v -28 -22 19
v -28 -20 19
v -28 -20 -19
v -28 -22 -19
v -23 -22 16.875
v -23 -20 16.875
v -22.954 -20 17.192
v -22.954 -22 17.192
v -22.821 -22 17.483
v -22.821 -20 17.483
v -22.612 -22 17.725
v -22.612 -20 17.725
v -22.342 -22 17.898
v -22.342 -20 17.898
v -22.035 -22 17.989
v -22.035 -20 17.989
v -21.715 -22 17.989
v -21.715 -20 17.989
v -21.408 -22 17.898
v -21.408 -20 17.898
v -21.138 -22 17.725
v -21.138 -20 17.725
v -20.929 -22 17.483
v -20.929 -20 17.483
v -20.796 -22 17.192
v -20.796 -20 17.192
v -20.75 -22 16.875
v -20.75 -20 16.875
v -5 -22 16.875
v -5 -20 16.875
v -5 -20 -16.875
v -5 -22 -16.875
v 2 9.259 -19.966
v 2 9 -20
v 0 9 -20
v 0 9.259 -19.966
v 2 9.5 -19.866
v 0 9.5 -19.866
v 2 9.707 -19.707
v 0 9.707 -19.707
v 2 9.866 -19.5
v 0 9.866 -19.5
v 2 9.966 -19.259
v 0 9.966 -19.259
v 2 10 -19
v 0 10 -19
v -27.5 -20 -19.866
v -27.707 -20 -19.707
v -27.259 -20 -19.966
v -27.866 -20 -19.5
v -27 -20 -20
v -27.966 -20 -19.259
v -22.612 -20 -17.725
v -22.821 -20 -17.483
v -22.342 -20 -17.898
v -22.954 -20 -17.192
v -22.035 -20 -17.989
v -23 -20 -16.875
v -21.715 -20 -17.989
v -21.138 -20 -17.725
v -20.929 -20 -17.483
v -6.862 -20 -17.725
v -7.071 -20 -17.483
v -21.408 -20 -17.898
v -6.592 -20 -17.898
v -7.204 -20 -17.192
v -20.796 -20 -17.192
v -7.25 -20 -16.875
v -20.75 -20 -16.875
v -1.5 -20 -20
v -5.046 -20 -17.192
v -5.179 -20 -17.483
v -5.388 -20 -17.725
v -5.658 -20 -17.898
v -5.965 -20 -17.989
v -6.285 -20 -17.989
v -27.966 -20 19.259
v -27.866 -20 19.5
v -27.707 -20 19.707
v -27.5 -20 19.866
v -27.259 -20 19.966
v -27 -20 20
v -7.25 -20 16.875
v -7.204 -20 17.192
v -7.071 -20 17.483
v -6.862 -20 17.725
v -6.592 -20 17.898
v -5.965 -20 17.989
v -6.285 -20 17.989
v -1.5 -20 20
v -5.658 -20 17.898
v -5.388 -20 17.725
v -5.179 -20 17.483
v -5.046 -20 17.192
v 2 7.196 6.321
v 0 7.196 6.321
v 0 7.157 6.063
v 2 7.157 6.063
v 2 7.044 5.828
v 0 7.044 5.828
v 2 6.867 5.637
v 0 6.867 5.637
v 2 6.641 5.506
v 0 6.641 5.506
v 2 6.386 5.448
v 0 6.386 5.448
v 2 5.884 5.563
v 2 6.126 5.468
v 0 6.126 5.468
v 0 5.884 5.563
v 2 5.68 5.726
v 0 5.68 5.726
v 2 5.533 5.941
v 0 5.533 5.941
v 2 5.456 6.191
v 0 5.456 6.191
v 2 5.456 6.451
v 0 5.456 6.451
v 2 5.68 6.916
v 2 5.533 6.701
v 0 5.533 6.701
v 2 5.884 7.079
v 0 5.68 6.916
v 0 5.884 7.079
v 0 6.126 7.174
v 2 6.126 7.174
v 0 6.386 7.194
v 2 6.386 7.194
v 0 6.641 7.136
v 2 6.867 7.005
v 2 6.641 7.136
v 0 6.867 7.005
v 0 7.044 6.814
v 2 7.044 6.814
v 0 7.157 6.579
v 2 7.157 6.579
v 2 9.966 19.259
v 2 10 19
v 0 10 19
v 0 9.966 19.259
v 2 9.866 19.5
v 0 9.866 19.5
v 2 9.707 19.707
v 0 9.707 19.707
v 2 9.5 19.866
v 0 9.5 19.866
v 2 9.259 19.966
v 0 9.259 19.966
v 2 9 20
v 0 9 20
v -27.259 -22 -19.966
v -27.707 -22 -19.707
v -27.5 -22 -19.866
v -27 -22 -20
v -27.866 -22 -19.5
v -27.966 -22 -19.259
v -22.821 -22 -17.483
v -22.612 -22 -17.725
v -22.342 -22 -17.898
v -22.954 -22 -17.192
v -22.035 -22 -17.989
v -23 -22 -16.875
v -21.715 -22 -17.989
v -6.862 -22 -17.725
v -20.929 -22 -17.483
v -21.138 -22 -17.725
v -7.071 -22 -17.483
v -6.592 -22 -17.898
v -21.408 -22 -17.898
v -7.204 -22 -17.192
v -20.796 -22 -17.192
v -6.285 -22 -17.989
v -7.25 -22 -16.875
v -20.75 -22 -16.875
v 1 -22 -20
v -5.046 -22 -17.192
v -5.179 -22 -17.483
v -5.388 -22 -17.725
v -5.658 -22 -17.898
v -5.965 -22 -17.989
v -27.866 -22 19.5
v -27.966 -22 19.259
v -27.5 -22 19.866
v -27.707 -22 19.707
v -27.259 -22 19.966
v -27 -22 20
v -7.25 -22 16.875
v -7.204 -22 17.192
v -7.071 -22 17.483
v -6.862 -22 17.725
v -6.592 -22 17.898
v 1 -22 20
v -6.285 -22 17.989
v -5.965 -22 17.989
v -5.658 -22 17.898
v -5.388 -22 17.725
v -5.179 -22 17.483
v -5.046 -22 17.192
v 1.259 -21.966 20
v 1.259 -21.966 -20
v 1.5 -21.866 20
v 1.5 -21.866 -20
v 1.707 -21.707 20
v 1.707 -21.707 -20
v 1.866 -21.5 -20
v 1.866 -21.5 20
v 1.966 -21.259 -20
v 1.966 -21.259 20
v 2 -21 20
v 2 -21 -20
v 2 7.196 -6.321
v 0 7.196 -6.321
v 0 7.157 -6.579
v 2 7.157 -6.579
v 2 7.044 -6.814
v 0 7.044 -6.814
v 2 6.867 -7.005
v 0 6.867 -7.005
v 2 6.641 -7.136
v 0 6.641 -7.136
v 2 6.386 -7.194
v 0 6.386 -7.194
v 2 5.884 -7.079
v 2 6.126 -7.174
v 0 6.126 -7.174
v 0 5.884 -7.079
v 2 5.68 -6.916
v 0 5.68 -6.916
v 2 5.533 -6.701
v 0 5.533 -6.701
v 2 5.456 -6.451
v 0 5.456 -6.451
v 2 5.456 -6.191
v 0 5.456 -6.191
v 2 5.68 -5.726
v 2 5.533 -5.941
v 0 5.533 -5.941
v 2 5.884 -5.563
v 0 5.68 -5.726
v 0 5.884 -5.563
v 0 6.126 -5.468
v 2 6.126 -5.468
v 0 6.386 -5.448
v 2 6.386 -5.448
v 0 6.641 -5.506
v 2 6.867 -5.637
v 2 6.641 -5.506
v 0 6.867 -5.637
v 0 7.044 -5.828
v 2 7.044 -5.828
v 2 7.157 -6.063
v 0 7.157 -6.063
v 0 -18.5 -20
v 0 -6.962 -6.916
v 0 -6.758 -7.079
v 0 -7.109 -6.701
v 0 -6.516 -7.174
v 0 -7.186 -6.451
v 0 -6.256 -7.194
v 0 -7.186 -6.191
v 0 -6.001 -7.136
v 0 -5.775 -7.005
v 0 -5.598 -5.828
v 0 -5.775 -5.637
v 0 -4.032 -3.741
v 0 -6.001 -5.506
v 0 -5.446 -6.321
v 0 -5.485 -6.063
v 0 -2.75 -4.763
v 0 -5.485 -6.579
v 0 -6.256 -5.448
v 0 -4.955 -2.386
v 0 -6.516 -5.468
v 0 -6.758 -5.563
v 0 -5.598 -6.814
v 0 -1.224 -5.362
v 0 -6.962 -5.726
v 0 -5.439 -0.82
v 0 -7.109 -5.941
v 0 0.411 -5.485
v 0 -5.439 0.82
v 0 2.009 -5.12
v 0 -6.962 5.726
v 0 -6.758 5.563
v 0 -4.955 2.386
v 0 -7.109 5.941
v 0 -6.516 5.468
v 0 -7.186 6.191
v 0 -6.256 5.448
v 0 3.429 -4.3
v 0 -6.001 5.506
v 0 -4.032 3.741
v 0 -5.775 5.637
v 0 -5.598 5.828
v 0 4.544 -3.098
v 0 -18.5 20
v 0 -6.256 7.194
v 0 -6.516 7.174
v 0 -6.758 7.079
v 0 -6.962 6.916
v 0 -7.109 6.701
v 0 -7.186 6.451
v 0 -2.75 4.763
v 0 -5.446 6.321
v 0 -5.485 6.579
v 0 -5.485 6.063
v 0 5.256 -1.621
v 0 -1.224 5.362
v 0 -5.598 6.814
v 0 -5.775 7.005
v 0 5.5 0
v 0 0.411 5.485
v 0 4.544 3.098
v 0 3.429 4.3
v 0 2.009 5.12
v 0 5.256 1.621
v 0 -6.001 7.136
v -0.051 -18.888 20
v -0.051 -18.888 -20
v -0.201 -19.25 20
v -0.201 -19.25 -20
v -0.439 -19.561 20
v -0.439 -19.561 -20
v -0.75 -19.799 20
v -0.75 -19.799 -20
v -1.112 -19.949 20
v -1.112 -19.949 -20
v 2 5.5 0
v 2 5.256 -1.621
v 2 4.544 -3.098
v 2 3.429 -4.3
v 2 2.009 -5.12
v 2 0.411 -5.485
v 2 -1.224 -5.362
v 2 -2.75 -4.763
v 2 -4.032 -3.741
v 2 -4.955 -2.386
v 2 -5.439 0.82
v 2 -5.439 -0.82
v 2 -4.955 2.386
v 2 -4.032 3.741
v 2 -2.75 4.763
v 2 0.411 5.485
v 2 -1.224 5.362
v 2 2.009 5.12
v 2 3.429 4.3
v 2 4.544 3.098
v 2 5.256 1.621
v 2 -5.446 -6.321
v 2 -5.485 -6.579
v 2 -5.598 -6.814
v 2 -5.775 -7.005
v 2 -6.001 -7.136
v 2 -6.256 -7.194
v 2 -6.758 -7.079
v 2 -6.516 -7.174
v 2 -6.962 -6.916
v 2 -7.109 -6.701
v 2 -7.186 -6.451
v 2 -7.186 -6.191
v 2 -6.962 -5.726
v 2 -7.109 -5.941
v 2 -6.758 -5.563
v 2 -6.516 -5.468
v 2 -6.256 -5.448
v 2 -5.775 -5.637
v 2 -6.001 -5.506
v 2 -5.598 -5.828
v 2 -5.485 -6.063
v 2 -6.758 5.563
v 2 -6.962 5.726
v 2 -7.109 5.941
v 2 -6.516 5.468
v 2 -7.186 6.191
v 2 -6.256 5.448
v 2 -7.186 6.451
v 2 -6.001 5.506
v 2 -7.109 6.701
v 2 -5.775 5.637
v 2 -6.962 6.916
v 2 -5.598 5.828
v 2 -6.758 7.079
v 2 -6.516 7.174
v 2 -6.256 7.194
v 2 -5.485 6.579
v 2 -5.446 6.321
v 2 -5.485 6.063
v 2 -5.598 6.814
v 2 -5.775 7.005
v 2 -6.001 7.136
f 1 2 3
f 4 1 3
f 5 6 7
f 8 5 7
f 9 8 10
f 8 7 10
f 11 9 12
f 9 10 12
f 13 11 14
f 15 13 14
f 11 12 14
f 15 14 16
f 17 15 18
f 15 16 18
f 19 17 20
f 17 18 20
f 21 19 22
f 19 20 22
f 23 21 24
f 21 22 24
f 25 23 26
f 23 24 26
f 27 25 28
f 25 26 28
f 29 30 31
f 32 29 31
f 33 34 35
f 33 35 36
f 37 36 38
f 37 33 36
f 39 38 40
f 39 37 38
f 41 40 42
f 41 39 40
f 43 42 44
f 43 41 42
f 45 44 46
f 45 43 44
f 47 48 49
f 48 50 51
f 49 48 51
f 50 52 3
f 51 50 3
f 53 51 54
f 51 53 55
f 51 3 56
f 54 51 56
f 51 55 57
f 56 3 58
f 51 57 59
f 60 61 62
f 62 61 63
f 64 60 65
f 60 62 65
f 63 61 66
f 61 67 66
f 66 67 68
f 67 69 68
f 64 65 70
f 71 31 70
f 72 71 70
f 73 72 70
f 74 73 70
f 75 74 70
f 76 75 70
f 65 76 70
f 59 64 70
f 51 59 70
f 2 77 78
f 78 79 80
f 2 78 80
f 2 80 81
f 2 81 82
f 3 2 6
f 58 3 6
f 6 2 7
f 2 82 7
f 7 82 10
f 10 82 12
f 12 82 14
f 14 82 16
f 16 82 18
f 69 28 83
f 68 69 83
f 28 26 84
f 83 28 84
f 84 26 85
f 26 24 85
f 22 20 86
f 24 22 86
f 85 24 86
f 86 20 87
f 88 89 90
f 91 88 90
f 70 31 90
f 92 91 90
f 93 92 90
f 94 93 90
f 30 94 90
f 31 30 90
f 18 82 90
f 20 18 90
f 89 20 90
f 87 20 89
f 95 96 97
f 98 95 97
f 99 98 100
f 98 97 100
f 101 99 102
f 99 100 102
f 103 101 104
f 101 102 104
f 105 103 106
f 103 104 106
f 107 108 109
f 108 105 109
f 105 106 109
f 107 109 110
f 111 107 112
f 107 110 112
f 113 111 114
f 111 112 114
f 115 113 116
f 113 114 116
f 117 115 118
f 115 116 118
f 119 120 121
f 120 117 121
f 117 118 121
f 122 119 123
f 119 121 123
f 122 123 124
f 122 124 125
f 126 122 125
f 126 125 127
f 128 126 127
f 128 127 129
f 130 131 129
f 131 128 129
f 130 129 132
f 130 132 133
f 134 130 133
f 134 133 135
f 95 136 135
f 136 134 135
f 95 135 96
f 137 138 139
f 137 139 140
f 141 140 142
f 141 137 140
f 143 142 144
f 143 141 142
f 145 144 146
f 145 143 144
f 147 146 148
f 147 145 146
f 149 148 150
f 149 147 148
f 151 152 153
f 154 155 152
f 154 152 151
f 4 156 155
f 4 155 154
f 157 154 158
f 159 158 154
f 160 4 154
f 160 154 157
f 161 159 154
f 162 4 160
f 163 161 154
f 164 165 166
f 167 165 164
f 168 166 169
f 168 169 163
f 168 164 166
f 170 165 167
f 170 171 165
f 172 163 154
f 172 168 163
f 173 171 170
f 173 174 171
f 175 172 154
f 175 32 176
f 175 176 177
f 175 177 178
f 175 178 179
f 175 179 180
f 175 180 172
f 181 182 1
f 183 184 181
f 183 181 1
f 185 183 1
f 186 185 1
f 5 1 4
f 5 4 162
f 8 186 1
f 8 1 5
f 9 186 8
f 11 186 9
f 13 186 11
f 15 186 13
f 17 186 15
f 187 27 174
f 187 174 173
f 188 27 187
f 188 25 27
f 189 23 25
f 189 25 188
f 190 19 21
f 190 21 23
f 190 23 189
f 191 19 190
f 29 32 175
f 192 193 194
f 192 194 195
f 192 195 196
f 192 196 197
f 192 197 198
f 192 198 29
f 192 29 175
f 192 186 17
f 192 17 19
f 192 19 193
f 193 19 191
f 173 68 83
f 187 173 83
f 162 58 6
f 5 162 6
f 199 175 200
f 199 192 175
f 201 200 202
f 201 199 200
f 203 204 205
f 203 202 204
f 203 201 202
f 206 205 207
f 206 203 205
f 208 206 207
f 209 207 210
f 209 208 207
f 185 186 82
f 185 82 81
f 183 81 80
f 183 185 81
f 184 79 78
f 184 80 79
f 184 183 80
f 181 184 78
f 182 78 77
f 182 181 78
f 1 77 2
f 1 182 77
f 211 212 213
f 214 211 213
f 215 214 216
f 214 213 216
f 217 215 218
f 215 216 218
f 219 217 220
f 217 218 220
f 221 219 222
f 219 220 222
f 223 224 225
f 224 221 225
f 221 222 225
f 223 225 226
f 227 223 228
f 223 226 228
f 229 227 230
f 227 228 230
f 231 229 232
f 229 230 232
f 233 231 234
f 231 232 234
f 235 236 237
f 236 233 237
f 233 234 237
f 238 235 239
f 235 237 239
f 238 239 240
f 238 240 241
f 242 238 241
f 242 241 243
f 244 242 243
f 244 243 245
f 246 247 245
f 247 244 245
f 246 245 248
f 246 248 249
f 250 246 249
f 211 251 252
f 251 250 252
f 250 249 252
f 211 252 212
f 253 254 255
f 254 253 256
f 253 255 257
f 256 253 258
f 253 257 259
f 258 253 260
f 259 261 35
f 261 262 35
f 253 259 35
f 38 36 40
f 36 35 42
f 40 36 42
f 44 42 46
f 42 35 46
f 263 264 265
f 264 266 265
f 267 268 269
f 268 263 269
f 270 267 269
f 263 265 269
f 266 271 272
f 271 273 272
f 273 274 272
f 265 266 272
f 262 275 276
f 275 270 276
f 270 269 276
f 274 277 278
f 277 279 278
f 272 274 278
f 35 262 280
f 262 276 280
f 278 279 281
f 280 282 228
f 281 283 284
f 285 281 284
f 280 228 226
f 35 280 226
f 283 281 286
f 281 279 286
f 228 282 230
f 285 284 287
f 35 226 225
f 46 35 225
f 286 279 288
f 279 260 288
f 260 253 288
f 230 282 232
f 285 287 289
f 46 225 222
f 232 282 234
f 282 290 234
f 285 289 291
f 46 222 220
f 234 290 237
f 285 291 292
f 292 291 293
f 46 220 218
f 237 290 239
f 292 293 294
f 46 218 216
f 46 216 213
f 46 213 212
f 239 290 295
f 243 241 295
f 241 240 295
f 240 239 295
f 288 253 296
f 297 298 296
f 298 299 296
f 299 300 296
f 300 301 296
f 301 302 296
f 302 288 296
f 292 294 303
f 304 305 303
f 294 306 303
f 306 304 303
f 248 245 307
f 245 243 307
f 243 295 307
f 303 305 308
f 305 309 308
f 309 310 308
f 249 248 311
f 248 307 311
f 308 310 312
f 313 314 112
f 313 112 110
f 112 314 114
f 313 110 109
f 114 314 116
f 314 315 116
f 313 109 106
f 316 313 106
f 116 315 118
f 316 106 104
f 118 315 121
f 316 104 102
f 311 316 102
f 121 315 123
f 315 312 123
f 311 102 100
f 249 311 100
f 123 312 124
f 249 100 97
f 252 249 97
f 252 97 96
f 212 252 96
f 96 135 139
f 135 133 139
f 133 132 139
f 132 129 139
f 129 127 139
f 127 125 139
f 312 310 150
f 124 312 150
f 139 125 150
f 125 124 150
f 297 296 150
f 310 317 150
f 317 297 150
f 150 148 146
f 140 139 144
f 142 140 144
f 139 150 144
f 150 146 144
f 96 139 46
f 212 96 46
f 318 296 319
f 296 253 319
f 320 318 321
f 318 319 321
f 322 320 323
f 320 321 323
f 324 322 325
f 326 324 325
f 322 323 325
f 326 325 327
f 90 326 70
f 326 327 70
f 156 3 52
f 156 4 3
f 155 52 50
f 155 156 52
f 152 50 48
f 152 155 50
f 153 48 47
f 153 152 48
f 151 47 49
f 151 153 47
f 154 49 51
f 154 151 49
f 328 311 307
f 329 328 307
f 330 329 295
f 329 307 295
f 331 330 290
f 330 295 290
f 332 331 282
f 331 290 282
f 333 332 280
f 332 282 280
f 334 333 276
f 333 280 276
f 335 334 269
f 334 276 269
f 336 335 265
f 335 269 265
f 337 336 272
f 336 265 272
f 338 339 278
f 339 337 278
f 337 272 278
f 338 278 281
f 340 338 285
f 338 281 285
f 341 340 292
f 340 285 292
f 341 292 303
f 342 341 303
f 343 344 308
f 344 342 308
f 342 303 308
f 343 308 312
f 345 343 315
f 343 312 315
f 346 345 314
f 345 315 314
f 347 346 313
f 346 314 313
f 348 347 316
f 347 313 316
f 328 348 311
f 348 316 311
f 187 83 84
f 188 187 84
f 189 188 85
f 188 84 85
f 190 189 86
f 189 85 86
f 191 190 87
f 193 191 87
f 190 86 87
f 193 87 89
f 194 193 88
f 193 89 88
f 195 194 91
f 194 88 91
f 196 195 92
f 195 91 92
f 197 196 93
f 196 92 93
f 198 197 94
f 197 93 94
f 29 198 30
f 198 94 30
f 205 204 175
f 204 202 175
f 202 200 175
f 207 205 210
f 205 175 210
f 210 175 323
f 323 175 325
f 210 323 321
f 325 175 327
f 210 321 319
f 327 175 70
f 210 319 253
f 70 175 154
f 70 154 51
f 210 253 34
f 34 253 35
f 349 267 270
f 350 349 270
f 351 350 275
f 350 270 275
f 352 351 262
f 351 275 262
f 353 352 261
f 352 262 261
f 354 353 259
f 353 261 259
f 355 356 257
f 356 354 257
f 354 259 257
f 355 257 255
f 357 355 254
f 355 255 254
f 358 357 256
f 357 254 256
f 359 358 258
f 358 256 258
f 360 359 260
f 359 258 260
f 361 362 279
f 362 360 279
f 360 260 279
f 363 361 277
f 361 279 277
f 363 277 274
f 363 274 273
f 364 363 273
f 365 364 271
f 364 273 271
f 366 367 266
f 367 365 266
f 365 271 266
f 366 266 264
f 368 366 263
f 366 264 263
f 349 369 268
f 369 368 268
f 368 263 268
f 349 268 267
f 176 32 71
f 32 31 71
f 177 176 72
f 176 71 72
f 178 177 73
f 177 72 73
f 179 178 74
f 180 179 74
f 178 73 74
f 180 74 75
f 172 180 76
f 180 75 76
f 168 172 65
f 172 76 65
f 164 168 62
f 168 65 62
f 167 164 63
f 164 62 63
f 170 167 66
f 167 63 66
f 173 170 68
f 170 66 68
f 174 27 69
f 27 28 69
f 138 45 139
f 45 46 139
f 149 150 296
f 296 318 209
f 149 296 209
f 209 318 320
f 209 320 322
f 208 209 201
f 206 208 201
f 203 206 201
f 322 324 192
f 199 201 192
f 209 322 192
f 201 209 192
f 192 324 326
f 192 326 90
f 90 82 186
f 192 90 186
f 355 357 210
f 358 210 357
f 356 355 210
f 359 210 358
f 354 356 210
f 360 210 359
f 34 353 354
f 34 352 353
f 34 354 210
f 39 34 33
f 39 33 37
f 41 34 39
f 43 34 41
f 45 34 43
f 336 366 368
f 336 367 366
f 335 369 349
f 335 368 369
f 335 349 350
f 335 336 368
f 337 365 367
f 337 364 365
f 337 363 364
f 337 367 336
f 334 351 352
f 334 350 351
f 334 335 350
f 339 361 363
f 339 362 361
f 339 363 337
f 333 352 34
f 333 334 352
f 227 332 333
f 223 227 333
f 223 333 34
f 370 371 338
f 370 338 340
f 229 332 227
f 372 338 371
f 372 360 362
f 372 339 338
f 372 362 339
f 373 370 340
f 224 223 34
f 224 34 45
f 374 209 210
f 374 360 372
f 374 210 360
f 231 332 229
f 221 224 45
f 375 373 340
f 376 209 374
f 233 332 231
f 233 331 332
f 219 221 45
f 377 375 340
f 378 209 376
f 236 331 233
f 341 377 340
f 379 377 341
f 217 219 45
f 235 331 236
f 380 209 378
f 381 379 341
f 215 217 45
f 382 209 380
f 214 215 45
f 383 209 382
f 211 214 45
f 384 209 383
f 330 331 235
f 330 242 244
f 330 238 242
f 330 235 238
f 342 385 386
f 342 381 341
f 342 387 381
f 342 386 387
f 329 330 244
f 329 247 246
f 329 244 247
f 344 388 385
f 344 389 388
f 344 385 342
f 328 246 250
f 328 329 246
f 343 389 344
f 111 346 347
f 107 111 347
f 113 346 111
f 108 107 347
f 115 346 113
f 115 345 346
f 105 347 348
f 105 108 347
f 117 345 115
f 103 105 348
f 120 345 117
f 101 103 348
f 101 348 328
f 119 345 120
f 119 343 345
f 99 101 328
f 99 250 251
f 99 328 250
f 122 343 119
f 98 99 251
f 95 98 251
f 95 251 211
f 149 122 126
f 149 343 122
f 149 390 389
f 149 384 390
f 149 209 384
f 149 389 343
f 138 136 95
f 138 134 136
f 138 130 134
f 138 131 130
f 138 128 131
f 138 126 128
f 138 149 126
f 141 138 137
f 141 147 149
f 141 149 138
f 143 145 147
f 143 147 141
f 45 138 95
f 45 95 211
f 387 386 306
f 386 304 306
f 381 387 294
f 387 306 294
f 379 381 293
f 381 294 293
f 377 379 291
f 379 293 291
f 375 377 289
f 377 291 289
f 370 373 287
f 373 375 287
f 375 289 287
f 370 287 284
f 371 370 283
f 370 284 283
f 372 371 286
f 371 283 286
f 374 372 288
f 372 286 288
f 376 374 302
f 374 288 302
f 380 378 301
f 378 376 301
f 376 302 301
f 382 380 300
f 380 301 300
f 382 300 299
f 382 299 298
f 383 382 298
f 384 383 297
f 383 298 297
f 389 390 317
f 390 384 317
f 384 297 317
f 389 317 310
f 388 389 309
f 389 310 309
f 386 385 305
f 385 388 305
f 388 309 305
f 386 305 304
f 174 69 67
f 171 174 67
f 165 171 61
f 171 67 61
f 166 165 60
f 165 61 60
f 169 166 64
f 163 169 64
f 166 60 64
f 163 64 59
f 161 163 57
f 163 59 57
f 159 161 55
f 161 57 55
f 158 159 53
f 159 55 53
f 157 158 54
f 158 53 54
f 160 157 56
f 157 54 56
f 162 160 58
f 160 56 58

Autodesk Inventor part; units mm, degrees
ref_plane "YZ Plane" through (0, 0, 0) normal (1, 0, 0) x (0, 1, 0)
ref_plane "XZ Plane" through (0, 0, 0) normal (0, 1, 0) x (-1, 0, 0)
ref_plane "XY Plane" through (0, 0, 0) normal (0, 0, 1) x (1, 0, 0)
sketch "Boceto1" plane through (0, 0, 0) normal (1, 0, 0) x (0, 1, 0)
  line L0 (-6.321, 6.321) -> (6.321, 6.321) construction
  line L1 (6.321, 6.321) -> (6.321, -6.321) construction
  line L2 (6.321, -6.321) -> (-6.321, -6.321) construction
  line L3 (-6.321, -6.321) -> (-6.321, 6.321) construction
  line L4 (-6.321, 6.321) -> (6.321, -6.321) construction
  line L5 (6.321, 6.321) -> (-6.321, -6.321) construction
  circle A0 centre (6.321, -6.321) radius 0.875
  line L6 (0, 0) -> (7.9878, 0) construction
  circle A1 centre (6.321, 6.321) radius 0.875
  line L7 (0, 0) -> (0, -13.4562) construction
  circle A2 centre (-6.321, -6.321) radius 0.875
  circle A3 centre (-6.321, 6.321) radius 0.875
  circle A4 centre (0, 0) radius 5.5
  line L8 (10, 20) -> (-20, 20)
  line L9 (-20, 20) -> (-20, -20)
  line L10 (-20, -20) -> (10, -20)
  line L11 (10, -20) -> (10, 20)
  dimension "d0" = 12.642
  dimension "d1" = 12.642
  dimension "d2" = 1.75
  dimension "d3" = 11
  dimension "d4" = 30
  dimension "d6" = 20
  dimension "d7" = 10
  dimension "d26" = 20
extrude "Extrusión1" add sketch "Boceto1" along normal blind 2
sketch "Boceto2" plane through (0, -20, -20) normal (0, -1, 0) x (1, 0, 0)
  line L0 (2, 0) -> (2, 40) projected
  line L1 (2, 40) -> (-28, 40)
  line L2 (-28, 40) -> (-28, 0)
  line L3 (-28, 0) -> (2, 0)
  line L4 (2, 0) -> (2, 40)
  point P0 (0, 20)
  point P1 (2, 0)
  dimension "d10" = 30
  dimension "d11" = 40
extrude "Extrusión2" add sketch "Boceto2" along normal blind 2
sketch "Boceto3" plane through (0, -20, -20) normal (0, 1, 0) x (1, 0, 0)
  line L0 (0, -40) -> (0, 0) projected
  line L1 (-28, 0) -> (0, 0) projected
  line L2 (-28, -40) -> (-28, 0) projected
  line L3 (0, -40) -> (-28, -40) projected
  line L4 (-6.125, -3.125) -> (-6.125, -36.875) construction
  line L5 (-7.25, -3.125) -> (-7.25, -36.875)
  line L6 (-5, -36.875) -> (-5, -3.125)
  arc A0 (-5, -3.125) -> (-7.25, -3.125) centre (-6.125, -3.125) ccw
  arc A1 (-7.25, -36.875) -> (-5, -36.875) centre (-6.125, -36.875) ccw
  line L7 (-21.875, -3.125) -> (-21.875, -36.875) construction
  line L8 (-23, -3.125) -> (-23, -36.875)
  line L9 (-20.75, -36.875) -> (-20.75, -3.125)
  arc A2 (-20.75, -3.125) -> (-23, -3.125) centre (-21.875, -3.125) ccw
  arc A3 (-23, -36.875) -> (-20.75, -36.875) centre (-21.875, -36.875) ccw
  point P0 (0, -20)
  point P1 (-6.125, -20)
  point P2 (-21.875, -20)
  point P3 (-21.875, -38)
  point P4 (-21.875, -2)
  point P5 (-6.125, -38)
  point P6 (-6.125, -2)
  dimension "d14" = 2.25
  dimension "d15" = 2.25
  dimension "d16" = 5
  dimension "d17" = 2
  dimension "d18" = 2
  dimension "d19" = 2
  dimension "d20" = 2
  dimension "d21" = 5
extrude "Extrusión3" cut sketch "Boceto3" against normal through all contours A0 L6 A1 L5 | A2 L9 A3 L8
fillet "Empalme1" radius 1.5 1 edges at (0, -20, 0)
fillet "Empalme2" radius 1 5 edges at (1, 10, 20) (1, 10, -20) (-28, -21, 20) (-28, -21, -20) (2, -22, 0)
properties part number "BRACKET__MOTOR"
